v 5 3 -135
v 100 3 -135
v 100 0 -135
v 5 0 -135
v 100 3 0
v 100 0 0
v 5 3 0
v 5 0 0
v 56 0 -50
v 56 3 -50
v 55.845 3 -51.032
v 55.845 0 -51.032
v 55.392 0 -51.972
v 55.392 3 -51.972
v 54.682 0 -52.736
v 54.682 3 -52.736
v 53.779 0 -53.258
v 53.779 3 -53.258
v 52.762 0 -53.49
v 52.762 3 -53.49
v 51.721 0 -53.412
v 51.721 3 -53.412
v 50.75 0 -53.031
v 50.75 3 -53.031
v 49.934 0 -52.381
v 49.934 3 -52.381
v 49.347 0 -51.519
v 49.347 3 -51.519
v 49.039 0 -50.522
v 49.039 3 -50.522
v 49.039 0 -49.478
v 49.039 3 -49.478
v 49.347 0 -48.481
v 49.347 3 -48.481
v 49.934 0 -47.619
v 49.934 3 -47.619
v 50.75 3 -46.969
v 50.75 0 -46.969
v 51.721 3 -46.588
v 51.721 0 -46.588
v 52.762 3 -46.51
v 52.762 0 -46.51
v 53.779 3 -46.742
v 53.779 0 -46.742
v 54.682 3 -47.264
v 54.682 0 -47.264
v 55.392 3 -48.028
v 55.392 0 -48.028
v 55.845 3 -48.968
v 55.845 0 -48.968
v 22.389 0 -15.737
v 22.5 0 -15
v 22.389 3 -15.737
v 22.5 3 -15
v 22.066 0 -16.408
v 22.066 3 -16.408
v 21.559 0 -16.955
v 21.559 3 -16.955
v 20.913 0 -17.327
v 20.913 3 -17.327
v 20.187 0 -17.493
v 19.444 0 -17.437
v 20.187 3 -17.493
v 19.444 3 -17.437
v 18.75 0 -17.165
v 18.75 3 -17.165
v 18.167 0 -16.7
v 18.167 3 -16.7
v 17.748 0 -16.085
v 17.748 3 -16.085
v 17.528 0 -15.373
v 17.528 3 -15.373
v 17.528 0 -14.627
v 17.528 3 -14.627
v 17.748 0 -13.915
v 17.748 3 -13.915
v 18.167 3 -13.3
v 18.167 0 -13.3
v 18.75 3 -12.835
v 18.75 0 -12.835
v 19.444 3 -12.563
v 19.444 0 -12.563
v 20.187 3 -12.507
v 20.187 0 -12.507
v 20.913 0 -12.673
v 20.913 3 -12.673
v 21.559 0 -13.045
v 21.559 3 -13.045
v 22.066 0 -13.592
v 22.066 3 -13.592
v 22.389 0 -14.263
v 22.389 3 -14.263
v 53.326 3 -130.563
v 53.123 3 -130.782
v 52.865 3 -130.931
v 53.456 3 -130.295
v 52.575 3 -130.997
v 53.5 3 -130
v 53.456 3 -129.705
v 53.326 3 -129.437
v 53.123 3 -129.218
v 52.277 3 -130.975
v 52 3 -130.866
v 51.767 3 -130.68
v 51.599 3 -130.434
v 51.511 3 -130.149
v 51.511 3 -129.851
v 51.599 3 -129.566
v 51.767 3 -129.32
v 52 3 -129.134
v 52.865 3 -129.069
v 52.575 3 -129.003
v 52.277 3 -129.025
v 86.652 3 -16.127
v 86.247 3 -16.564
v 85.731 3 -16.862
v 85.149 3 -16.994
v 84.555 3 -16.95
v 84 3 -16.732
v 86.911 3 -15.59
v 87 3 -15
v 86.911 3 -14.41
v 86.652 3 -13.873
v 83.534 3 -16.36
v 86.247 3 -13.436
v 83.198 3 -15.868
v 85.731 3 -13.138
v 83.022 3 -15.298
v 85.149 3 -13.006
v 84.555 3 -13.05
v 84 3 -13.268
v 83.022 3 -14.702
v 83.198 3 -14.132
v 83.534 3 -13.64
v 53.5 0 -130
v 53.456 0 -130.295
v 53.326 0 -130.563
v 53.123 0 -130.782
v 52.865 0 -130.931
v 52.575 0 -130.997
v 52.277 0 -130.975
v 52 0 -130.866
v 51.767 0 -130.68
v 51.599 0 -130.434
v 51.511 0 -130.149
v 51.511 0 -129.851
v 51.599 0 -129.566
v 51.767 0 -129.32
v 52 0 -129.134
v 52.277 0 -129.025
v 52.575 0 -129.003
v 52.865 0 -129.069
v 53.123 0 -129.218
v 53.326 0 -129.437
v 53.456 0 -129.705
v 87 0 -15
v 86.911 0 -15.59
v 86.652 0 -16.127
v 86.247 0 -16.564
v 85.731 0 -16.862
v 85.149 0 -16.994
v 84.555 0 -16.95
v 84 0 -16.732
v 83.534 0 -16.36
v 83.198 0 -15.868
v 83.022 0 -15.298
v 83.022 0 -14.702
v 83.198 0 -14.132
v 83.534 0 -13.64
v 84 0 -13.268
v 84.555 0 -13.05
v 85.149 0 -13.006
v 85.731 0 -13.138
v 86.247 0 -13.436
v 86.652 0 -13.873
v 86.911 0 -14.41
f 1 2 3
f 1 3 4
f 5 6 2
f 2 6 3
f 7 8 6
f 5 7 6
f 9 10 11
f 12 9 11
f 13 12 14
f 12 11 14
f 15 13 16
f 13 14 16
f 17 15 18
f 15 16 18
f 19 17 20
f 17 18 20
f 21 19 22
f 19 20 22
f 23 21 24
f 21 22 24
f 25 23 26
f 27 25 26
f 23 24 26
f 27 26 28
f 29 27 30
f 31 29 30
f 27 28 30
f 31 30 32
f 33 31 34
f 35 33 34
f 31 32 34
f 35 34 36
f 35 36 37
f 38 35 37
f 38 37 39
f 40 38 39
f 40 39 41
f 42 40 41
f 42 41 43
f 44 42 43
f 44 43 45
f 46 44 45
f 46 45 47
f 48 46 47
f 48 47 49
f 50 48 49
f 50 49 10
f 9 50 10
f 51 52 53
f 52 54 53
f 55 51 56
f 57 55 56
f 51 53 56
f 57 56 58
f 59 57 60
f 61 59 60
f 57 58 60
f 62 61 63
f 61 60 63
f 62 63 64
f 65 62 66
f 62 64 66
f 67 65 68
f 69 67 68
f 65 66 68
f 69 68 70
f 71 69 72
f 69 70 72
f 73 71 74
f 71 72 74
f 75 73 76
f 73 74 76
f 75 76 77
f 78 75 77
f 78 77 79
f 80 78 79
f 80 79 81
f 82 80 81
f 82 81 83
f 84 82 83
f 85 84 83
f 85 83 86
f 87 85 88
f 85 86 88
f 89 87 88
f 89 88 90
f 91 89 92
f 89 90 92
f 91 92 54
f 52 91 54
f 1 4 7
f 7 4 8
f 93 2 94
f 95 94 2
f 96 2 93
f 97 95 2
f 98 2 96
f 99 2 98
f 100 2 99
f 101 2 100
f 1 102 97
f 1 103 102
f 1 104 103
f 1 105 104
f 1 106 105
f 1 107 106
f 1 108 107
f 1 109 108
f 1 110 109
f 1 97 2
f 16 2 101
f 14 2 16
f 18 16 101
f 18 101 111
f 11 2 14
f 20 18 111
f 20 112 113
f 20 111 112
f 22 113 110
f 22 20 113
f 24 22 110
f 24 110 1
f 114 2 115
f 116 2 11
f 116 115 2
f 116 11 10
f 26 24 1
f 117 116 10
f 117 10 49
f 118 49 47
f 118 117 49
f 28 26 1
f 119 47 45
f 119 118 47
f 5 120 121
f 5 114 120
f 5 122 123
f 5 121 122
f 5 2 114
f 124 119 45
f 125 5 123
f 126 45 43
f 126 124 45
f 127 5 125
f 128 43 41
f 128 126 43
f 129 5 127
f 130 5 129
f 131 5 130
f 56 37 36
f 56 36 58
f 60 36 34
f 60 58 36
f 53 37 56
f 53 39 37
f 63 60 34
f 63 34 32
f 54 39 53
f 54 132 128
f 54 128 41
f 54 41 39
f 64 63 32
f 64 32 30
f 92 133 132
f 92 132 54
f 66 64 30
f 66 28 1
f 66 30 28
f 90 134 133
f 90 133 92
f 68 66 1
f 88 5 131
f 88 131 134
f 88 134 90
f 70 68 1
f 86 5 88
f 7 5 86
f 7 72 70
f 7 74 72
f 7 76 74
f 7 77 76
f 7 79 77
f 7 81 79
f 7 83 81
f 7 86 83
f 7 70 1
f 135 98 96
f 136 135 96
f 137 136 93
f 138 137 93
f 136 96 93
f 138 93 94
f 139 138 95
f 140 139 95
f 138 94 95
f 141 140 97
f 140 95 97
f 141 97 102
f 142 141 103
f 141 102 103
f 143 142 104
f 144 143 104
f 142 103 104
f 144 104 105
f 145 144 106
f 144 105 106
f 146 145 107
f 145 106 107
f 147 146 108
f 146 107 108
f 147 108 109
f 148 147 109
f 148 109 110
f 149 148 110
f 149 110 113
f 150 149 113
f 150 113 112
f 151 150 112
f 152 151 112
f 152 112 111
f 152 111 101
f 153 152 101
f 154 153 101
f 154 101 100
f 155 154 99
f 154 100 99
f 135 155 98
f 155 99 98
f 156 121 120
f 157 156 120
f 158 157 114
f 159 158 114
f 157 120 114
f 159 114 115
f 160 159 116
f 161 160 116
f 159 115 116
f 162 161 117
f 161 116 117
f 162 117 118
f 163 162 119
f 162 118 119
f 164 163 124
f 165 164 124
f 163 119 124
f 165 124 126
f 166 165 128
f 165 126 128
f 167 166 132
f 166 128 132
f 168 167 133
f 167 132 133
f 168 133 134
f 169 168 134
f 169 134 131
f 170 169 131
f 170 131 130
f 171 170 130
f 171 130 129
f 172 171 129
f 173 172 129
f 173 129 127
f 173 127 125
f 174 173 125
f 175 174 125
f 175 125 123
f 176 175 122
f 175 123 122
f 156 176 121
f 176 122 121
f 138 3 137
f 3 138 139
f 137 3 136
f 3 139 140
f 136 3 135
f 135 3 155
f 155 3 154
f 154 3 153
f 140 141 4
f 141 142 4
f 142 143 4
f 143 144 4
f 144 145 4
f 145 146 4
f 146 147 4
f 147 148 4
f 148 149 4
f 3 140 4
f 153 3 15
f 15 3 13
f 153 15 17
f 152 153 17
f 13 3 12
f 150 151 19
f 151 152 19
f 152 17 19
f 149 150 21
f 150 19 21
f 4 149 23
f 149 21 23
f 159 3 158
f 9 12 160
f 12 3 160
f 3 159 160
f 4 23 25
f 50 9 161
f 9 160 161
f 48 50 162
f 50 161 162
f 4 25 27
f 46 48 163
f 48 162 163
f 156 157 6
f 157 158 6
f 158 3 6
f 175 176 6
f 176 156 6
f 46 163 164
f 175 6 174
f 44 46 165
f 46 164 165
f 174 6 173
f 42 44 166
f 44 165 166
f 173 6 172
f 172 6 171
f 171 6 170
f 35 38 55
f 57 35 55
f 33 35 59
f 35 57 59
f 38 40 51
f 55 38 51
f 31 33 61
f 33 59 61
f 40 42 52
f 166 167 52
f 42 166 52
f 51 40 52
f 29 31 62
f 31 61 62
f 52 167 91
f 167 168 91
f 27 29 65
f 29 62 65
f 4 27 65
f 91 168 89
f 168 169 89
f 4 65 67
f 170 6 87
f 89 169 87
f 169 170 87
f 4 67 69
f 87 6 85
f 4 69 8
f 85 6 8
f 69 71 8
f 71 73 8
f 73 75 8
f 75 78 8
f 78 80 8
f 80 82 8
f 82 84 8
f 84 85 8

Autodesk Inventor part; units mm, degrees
ref_plane "YZ Plane" through (0, 0, 0) normal (1, 0, 0) x (0, 1, 0)
ref_plane "XZ Plane" through (0, 0, 0) normal (0, 1, 0) x (-1, 0, 0)
ref_plane "XY Plane" through (0, 0, 0) normal (0, 0, 1) x (1, 0, 0)
sketch "Boceto1" plane through (0, 0, 0) normal (0, 1, 0) x (-1, 0, 0)
  line L0 (0, 0) -> (-105, 0)
  line L1 (-105, 0) -> (-105, -140)
  line L2 (-105, -140) -> (0, -140)
  line L3 (0, -140) -> (0, 0)
  dimension "d0" = 105
  dimension "d1" = 140
extrude "Extrusión1" add sketch "Boceto1" along normal blind 3
sketch "Boceto2" plane through (0, 3, 0) normal (0, 1, 0) x (1, 0, 0)
  circle A0 centre (85, 15) radius 2
  circle A1 centre (20, 15) radius 2.5
  circle A2 centre (52.5, 50) radius 3.5
  line L0 (0, 0) -> (105, 0) projected
  line L1 (0, 140) -> (0, 0) projected
  line L2 (105, 0) -> (105, 140) projected
  line L3 (52.5, 50) -> (52.5, -7.4445)
  dimension "d4" = 4
  dimension "d5" = 5
  dimension "d6" = 7
  dimension "d7" = 15
  dimension "d8" = 15
  dimension "d9" = 50
  dimension "d10" = 52.5
  dimension "d11" = 105
  dimension "d14" = 85
  dimension "d15" = 85
extrude "Extrusión2" cut sketch "Boceto2" against normal blind 3
sketch "Boceto3" plane through (0, 3, 0) normal (0, 1, 0) x (1, 0, 0)
  circle A0 centre (20, 15) radius 2.5 projected
  circle A1 centre (85, 15) radius 2 projected
  circle A2 centre (52.5, 50) radius 3.5 projected
  line L0 (0, 0) -> (105, 0) projected
  line L1 (105, 0) -> (105, 140) projected
  line L2 (105, 140) -> (0, 140) projected
  line L3 (0, 140) -> (0, 0) projected
  circle A3 centre (52.5, 130) radius 1
  dimension "d18" = 2
  dimension "d19" = 0
  dimension "d20" = 10
extrude "Extrusión3" cut sketch "Boceto3" against normal blind 3 contours A3
sketch "Boceto4" plane through (105, 0, -140) normal (0, 0, -1) x (-1, 0, 0)
  line L0 (0, 0) -> (105, 0) projected
  line L1 (105, 0) -> (105, 3) projected
  line L2 (0, 3) -> (105, 3) projected
  line L3 (0, 0) -> (0, 3) projected
extrude "Extrusión4" cut sketch "Boceto4" against normal blind 5
sketch "Boceto5" plane through (0, 3, 0) normal (0, 1, 0) x (1, 0, 0)
  line L0 (105, 135) -> (0, 135) projected
  line L1 (0, 135) -> (0, 0) projected
  line L2 (0, 0) -> (105, 0) projected
  line L3 (105, 0) -> (105, 135) projected
  circle A0 centre (52.5, 50) radius 3.5 projected
  circle A1 centre (85, 15) radius 2 projected
  circle A2 centre (20, 15) radius 2.5 projected
  circle A3 centre (52.5, 130) radius 1 projected
  line L4 (105, 135) -> (0, 135) projected
  line L5 (102.5, 0) -> (2.5, 0)
  line L6 (2.5, 0) -> (2.5, 135)
  line L7 (2.5, 135) -> (102.5, 135)
  line L8 (102.5, 135) -> (102.5, 0)
  line L9 (102.5, 0) -> (2.5, 135) construction
  line L10 (2.5, 0) -> (102.5, 135) construction
  point P0 (52.5, 67.5)
  dimension "d25" = 100
extrude "Extrusión5" cut sketch "Boceto5" against normal blind 3 contours L3 L2 L8 L0 | L6 L2 L1 L0
sketch "Boceto6" plane through (0, 0, 0) normal (0, -1, 0) x (1, 0, 0)
  line L0 (102.5, -135) -> (102.5, 0) projected
  line L1 (2.5, 0) -> (102.5, 0) projected
  line L2 (2.5, 0) -> (2.5, -135) projected
  line L3 (2.5, -135) -> (102.5, -135) projected
  circle A0 centre (52.5, -130) radius 1 projected
  circle A1 centre (20, -15) radius 2.5 projected
  circle A2 centre (85, -15) radius 2 projected
  circle A3 centre (52.5, -50) radius 3.5 projected
  line L4 (2.5, 0) -> (102.5, 0) projected
  line L5 (100, -135) -> (5, -135)
  line L6 (5, -135) -> (5, 0)
  line L7 (5, 0) -> (100, 0)
  line L8 (100, 0) -> (100, -135)
  line L9 (100, -135) -> (5, 0) construction
  line L10 (5, -135) -> (100, 0) construction
  point P0 (0, 0)
  point P1 (52.5, -67.5)
  dimension "d28" = 95
extrude "Extrusión6" cut sketch "Boceto6" against normal blind 3 contours L3 L8 L1 L0 | L3 L2 L1 L6
equation "\"d10\" = 0.5 * d11"
properties part number "trasera"
